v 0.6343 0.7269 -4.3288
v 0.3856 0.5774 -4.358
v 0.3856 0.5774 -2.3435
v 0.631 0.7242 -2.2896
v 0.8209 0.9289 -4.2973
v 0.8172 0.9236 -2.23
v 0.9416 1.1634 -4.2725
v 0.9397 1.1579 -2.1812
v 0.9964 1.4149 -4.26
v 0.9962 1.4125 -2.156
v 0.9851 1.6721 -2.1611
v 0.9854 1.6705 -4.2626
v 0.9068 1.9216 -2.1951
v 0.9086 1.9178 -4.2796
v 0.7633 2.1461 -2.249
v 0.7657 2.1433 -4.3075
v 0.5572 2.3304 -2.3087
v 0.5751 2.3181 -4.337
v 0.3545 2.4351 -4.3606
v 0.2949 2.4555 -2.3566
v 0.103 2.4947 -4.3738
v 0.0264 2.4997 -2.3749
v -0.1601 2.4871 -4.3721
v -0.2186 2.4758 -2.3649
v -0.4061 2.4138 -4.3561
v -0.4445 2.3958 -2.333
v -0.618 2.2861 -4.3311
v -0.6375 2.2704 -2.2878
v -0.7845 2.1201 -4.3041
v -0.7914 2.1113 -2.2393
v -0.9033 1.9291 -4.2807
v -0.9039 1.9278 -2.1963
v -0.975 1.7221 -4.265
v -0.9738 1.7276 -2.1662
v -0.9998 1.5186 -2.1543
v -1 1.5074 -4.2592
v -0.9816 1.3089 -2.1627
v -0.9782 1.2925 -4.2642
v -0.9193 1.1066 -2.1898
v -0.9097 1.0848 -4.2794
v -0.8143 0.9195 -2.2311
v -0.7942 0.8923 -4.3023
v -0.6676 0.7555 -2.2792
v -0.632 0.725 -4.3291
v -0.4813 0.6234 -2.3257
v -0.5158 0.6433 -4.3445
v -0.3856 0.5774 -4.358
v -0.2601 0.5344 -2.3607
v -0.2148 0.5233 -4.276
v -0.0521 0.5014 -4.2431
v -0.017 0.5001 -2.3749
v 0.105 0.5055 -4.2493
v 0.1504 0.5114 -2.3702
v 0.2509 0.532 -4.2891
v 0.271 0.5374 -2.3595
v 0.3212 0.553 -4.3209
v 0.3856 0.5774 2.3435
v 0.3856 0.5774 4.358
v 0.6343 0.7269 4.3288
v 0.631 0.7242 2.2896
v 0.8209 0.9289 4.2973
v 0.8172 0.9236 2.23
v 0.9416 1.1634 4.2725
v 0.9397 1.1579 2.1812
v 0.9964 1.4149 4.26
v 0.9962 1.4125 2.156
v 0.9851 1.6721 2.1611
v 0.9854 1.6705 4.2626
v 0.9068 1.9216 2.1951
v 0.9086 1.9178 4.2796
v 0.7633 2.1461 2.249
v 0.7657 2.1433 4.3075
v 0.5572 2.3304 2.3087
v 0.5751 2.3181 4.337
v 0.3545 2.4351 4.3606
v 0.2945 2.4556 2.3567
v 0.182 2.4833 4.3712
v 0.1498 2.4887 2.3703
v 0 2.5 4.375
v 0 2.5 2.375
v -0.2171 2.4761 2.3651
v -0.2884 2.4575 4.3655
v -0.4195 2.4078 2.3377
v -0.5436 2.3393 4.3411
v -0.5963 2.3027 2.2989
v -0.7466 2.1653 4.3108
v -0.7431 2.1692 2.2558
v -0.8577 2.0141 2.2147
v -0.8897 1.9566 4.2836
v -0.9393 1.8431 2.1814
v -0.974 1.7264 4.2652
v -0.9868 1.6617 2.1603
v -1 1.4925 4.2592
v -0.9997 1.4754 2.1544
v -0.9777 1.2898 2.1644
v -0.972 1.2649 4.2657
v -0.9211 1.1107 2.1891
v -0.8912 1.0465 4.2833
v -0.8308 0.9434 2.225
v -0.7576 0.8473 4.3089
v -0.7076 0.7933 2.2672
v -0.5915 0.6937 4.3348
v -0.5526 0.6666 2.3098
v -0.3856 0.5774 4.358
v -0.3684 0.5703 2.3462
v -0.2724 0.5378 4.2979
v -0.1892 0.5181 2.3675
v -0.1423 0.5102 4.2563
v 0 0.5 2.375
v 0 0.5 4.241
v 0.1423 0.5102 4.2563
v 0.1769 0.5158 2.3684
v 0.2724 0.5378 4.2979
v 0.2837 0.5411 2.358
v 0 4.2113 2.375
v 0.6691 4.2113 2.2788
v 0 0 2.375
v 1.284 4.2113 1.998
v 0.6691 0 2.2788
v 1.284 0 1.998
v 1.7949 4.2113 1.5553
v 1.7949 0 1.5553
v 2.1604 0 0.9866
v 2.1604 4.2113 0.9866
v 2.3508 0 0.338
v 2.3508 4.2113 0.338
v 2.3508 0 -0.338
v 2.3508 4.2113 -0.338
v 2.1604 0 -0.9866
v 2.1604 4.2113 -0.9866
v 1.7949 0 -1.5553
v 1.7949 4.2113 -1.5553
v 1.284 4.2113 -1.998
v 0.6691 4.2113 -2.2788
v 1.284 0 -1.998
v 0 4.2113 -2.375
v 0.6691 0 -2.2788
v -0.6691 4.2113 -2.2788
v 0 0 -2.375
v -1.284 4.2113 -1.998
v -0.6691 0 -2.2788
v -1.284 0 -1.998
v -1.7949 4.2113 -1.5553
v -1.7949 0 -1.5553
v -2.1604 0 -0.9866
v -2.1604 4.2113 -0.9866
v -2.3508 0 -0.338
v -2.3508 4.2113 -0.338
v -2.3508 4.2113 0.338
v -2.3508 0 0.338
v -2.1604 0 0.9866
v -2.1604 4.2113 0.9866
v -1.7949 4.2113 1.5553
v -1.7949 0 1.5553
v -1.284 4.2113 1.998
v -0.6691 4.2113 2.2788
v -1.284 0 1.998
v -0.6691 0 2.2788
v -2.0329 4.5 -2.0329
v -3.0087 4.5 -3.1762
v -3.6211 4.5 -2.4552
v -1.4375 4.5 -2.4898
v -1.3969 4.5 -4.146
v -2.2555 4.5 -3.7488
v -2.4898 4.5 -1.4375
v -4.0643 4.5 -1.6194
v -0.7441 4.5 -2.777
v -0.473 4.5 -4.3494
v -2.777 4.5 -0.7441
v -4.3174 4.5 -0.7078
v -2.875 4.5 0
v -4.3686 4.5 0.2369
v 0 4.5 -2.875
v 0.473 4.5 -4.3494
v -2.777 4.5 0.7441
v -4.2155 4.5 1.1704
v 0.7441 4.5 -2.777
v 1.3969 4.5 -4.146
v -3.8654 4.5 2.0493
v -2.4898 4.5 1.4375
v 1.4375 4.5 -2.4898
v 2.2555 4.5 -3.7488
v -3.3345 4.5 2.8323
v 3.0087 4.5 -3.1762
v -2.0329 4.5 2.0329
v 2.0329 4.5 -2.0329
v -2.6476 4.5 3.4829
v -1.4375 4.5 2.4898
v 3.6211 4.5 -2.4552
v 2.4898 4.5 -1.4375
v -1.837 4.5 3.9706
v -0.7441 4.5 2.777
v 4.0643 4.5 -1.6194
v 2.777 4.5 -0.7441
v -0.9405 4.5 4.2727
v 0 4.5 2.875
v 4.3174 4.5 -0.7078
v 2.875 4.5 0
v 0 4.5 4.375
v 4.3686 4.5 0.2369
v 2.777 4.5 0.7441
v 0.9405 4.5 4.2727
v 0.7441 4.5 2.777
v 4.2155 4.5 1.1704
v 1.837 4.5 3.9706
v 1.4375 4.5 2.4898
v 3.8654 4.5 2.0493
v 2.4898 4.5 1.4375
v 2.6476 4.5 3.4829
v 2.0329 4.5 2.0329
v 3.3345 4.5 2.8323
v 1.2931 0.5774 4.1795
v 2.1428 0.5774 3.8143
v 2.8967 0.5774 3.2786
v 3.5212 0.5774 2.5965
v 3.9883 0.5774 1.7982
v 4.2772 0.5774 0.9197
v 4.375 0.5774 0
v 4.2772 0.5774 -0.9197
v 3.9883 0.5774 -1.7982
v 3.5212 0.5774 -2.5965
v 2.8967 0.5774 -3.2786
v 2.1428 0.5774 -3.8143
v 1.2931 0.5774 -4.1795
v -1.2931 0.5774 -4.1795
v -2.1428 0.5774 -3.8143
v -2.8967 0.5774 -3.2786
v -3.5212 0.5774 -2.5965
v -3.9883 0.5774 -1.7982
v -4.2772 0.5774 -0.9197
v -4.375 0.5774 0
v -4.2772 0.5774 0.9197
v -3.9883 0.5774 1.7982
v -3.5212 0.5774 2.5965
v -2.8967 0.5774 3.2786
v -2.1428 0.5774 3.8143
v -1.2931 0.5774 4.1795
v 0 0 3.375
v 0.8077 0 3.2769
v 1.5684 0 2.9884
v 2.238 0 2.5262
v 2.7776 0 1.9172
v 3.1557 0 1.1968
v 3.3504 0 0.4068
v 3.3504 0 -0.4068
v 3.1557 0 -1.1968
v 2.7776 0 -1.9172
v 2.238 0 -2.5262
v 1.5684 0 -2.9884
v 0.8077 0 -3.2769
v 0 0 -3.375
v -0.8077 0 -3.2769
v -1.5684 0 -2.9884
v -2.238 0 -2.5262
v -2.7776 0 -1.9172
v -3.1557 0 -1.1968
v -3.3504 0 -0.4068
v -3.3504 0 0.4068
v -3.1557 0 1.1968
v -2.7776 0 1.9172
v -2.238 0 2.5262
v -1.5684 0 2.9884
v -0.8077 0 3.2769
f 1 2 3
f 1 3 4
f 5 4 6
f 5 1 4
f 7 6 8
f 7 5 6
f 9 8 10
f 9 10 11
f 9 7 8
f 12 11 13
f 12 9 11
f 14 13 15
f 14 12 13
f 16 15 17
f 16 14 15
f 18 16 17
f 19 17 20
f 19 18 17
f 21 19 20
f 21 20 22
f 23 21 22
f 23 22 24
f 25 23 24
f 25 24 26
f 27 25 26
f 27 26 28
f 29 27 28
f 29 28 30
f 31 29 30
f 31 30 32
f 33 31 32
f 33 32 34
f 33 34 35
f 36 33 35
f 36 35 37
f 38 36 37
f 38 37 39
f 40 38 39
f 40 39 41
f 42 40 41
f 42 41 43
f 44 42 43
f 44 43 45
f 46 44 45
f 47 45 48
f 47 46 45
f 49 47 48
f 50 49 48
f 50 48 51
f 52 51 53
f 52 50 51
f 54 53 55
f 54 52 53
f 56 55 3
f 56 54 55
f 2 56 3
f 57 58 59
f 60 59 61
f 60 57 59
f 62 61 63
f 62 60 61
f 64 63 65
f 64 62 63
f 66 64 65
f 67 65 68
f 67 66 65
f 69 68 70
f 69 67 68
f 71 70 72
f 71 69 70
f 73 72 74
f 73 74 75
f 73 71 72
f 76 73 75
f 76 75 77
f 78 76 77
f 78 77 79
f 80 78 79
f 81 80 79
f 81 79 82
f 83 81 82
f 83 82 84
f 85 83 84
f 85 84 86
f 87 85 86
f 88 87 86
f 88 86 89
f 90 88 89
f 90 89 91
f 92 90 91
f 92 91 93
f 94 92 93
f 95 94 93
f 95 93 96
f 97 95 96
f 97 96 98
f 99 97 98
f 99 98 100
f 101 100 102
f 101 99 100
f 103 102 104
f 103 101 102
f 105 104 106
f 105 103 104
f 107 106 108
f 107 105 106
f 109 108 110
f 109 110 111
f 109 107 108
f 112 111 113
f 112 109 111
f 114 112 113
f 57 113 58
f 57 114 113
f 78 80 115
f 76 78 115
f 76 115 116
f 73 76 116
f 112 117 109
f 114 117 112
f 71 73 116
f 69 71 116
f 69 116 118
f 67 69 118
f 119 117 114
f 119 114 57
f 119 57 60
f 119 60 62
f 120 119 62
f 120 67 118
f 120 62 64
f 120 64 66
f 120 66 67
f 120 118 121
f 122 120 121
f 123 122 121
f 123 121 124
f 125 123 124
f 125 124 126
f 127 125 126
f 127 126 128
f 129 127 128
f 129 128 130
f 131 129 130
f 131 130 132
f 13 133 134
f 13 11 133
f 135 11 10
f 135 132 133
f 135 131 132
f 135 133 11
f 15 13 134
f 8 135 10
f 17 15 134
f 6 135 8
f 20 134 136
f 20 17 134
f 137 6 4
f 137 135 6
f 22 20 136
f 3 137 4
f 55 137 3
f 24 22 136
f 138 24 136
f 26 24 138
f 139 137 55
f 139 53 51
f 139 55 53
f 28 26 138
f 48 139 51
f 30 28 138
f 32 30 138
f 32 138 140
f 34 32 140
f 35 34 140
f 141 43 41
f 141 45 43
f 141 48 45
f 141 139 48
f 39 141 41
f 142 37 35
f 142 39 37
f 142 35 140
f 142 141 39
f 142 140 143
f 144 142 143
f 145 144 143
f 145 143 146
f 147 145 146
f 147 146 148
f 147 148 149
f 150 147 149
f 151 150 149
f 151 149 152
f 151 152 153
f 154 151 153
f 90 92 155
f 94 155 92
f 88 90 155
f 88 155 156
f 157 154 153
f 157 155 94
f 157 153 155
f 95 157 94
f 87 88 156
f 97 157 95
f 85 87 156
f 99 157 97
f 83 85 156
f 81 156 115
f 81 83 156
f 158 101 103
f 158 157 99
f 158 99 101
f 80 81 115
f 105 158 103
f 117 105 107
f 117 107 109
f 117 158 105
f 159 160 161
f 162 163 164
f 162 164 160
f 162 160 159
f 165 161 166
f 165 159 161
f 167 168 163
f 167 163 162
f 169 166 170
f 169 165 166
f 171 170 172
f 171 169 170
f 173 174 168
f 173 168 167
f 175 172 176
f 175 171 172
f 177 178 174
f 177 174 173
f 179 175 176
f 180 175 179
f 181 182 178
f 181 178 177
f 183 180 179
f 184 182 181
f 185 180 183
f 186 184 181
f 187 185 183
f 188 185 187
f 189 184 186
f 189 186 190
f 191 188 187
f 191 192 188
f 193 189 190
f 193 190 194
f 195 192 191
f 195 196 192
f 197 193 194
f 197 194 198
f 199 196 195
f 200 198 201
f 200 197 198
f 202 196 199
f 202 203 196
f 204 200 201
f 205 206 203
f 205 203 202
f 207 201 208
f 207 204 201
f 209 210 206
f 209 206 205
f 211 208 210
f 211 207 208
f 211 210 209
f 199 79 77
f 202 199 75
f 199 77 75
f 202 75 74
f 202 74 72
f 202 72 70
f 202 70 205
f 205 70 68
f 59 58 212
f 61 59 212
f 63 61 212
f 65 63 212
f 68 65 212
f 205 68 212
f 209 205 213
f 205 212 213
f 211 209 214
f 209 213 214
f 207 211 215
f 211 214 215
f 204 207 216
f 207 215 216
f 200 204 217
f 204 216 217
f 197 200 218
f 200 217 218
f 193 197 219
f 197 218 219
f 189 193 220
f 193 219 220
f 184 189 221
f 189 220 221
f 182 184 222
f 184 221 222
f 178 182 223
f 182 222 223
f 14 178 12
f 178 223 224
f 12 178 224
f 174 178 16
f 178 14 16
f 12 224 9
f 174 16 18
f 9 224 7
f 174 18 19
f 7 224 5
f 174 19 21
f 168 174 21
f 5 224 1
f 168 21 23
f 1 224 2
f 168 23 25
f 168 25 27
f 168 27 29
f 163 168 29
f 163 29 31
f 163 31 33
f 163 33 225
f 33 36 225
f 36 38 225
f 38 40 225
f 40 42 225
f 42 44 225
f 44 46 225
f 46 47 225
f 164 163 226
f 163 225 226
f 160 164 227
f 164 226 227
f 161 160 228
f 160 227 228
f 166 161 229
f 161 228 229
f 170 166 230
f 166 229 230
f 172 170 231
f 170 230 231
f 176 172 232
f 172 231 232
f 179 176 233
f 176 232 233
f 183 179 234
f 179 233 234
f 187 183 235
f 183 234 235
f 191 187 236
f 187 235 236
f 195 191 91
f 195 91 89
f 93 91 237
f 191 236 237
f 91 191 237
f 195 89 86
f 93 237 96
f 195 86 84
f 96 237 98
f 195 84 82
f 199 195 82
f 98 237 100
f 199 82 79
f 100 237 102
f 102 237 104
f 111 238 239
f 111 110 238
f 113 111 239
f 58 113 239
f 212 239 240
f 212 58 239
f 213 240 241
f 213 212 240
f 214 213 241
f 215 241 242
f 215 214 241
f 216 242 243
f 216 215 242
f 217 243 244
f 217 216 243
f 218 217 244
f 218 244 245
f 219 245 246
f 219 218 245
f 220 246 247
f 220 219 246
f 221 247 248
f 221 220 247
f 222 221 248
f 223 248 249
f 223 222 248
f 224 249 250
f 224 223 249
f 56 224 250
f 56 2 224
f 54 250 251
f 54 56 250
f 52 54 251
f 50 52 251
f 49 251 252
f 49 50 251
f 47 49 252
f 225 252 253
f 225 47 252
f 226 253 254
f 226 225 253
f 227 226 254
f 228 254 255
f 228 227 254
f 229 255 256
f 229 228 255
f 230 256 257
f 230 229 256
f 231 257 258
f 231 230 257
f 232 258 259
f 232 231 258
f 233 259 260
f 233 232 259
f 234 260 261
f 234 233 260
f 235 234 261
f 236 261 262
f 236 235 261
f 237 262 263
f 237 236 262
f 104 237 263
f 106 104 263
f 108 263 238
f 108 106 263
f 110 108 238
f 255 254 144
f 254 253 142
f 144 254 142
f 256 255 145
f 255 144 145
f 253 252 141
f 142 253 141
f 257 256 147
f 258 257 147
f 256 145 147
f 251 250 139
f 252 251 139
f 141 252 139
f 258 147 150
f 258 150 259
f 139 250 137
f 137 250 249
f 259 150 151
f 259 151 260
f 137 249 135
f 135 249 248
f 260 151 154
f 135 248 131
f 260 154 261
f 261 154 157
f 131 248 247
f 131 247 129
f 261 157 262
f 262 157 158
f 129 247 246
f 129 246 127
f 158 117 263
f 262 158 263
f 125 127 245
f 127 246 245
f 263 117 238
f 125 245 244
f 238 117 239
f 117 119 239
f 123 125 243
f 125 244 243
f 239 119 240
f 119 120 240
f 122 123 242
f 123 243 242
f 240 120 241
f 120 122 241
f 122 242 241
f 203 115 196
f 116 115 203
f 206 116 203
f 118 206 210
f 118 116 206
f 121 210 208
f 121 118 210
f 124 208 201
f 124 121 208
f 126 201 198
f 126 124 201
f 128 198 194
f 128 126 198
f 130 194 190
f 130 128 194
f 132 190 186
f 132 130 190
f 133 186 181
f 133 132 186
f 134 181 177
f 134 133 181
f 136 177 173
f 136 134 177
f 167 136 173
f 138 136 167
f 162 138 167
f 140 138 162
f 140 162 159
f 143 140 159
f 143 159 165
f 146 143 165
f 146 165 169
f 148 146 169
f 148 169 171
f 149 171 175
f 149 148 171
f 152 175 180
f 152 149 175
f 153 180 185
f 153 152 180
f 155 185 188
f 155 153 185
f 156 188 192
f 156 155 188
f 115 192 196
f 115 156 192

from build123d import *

# Parameters (mm, degrees)
SKETCH1_R               = 4.375
SKETCH1_R_2             = 2.375
BOSS_EXTRUDE1_DEPTH     = 4.5
CHAMFER1_SIZE           = 0.5
CHAMFER1_SIZE2          = 0.288675135
CHAMFER2_SIZE           = 1
CHAMFER2_SIZE2          = 0.577350269
CUT_EXTRUDE1_DEPTH      = 8.650571874
CUT_EXTRUDE1_DEPTH_BACK = 8.650571874
SKETCH2_R               = 1


with BuildPart() as part:
    # Sketch1 → Boss-Extrude1 (new body)
    with BuildSketch(Plane(origin=(0, 0, 0), x_dir=(1, 0, 0), z_dir=(0, 1, 0))):
        with Locations(Location((0, 0, 0), (0, 0, 270))):
            Circle(SKETCH1_R)
        with Locations(Location((0, 0, 0), (0, 0, 270))):
            Circle(SKETCH1_R_2, mode=Mode.SUBTRACT)
    extrude(amount=BOSS_EXTRUDE1_DEPTH)

    # Chamfer1
    chamfer1_edges = [part.edges().sort_by_distance(p)[0] for p in [
        (0, 4.5, -2.375),
    ]]
    chamfer1_side = [part.faces().sort_by_distance(p)[0] for p in [
        (0, 4.5, -4.251256313),
    ]]
    chamfer(chamfer1_edges, length=CHAMFER1_SIZE, length2=CHAMFER1_SIZE2, reference=chamfer1_side[0])

    # Chamfer2
    chamfer2_edges = [part.edges().sort_by_distance(p)[0] for p in [
        (0, 0, -4.375),
    ]]
    chamfer2_side = [part.faces().sort_by_distance(p)[0] for p in [
        (0, 0, -4.251256313),
    ]]
    chamfer(chamfer2_edges, length=CHAMFER2_SIZE, length2=CHAMFER2_SIZE2, reference=chamfer2_side[0])

    # Sketch2 → Cut-Extrude1 (cut, two sides: drawn at the far end of the back side and taken through both)
    with BuildSketch(Plane.XY.offset(-CUT_EXTRUDE1_DEPTH_BACK)):
        with Locations(Location((0, 1.5, 0), (0, 0, 292.683630924))):
            Circle(SKETCH2_R)
    extrude(amount=CUT_EXTRUDE1_DEPTH + CUT_EXTRUDE1_DEPTH_BACK, mode=Mode.SUBTRACT)


solid = part.part
